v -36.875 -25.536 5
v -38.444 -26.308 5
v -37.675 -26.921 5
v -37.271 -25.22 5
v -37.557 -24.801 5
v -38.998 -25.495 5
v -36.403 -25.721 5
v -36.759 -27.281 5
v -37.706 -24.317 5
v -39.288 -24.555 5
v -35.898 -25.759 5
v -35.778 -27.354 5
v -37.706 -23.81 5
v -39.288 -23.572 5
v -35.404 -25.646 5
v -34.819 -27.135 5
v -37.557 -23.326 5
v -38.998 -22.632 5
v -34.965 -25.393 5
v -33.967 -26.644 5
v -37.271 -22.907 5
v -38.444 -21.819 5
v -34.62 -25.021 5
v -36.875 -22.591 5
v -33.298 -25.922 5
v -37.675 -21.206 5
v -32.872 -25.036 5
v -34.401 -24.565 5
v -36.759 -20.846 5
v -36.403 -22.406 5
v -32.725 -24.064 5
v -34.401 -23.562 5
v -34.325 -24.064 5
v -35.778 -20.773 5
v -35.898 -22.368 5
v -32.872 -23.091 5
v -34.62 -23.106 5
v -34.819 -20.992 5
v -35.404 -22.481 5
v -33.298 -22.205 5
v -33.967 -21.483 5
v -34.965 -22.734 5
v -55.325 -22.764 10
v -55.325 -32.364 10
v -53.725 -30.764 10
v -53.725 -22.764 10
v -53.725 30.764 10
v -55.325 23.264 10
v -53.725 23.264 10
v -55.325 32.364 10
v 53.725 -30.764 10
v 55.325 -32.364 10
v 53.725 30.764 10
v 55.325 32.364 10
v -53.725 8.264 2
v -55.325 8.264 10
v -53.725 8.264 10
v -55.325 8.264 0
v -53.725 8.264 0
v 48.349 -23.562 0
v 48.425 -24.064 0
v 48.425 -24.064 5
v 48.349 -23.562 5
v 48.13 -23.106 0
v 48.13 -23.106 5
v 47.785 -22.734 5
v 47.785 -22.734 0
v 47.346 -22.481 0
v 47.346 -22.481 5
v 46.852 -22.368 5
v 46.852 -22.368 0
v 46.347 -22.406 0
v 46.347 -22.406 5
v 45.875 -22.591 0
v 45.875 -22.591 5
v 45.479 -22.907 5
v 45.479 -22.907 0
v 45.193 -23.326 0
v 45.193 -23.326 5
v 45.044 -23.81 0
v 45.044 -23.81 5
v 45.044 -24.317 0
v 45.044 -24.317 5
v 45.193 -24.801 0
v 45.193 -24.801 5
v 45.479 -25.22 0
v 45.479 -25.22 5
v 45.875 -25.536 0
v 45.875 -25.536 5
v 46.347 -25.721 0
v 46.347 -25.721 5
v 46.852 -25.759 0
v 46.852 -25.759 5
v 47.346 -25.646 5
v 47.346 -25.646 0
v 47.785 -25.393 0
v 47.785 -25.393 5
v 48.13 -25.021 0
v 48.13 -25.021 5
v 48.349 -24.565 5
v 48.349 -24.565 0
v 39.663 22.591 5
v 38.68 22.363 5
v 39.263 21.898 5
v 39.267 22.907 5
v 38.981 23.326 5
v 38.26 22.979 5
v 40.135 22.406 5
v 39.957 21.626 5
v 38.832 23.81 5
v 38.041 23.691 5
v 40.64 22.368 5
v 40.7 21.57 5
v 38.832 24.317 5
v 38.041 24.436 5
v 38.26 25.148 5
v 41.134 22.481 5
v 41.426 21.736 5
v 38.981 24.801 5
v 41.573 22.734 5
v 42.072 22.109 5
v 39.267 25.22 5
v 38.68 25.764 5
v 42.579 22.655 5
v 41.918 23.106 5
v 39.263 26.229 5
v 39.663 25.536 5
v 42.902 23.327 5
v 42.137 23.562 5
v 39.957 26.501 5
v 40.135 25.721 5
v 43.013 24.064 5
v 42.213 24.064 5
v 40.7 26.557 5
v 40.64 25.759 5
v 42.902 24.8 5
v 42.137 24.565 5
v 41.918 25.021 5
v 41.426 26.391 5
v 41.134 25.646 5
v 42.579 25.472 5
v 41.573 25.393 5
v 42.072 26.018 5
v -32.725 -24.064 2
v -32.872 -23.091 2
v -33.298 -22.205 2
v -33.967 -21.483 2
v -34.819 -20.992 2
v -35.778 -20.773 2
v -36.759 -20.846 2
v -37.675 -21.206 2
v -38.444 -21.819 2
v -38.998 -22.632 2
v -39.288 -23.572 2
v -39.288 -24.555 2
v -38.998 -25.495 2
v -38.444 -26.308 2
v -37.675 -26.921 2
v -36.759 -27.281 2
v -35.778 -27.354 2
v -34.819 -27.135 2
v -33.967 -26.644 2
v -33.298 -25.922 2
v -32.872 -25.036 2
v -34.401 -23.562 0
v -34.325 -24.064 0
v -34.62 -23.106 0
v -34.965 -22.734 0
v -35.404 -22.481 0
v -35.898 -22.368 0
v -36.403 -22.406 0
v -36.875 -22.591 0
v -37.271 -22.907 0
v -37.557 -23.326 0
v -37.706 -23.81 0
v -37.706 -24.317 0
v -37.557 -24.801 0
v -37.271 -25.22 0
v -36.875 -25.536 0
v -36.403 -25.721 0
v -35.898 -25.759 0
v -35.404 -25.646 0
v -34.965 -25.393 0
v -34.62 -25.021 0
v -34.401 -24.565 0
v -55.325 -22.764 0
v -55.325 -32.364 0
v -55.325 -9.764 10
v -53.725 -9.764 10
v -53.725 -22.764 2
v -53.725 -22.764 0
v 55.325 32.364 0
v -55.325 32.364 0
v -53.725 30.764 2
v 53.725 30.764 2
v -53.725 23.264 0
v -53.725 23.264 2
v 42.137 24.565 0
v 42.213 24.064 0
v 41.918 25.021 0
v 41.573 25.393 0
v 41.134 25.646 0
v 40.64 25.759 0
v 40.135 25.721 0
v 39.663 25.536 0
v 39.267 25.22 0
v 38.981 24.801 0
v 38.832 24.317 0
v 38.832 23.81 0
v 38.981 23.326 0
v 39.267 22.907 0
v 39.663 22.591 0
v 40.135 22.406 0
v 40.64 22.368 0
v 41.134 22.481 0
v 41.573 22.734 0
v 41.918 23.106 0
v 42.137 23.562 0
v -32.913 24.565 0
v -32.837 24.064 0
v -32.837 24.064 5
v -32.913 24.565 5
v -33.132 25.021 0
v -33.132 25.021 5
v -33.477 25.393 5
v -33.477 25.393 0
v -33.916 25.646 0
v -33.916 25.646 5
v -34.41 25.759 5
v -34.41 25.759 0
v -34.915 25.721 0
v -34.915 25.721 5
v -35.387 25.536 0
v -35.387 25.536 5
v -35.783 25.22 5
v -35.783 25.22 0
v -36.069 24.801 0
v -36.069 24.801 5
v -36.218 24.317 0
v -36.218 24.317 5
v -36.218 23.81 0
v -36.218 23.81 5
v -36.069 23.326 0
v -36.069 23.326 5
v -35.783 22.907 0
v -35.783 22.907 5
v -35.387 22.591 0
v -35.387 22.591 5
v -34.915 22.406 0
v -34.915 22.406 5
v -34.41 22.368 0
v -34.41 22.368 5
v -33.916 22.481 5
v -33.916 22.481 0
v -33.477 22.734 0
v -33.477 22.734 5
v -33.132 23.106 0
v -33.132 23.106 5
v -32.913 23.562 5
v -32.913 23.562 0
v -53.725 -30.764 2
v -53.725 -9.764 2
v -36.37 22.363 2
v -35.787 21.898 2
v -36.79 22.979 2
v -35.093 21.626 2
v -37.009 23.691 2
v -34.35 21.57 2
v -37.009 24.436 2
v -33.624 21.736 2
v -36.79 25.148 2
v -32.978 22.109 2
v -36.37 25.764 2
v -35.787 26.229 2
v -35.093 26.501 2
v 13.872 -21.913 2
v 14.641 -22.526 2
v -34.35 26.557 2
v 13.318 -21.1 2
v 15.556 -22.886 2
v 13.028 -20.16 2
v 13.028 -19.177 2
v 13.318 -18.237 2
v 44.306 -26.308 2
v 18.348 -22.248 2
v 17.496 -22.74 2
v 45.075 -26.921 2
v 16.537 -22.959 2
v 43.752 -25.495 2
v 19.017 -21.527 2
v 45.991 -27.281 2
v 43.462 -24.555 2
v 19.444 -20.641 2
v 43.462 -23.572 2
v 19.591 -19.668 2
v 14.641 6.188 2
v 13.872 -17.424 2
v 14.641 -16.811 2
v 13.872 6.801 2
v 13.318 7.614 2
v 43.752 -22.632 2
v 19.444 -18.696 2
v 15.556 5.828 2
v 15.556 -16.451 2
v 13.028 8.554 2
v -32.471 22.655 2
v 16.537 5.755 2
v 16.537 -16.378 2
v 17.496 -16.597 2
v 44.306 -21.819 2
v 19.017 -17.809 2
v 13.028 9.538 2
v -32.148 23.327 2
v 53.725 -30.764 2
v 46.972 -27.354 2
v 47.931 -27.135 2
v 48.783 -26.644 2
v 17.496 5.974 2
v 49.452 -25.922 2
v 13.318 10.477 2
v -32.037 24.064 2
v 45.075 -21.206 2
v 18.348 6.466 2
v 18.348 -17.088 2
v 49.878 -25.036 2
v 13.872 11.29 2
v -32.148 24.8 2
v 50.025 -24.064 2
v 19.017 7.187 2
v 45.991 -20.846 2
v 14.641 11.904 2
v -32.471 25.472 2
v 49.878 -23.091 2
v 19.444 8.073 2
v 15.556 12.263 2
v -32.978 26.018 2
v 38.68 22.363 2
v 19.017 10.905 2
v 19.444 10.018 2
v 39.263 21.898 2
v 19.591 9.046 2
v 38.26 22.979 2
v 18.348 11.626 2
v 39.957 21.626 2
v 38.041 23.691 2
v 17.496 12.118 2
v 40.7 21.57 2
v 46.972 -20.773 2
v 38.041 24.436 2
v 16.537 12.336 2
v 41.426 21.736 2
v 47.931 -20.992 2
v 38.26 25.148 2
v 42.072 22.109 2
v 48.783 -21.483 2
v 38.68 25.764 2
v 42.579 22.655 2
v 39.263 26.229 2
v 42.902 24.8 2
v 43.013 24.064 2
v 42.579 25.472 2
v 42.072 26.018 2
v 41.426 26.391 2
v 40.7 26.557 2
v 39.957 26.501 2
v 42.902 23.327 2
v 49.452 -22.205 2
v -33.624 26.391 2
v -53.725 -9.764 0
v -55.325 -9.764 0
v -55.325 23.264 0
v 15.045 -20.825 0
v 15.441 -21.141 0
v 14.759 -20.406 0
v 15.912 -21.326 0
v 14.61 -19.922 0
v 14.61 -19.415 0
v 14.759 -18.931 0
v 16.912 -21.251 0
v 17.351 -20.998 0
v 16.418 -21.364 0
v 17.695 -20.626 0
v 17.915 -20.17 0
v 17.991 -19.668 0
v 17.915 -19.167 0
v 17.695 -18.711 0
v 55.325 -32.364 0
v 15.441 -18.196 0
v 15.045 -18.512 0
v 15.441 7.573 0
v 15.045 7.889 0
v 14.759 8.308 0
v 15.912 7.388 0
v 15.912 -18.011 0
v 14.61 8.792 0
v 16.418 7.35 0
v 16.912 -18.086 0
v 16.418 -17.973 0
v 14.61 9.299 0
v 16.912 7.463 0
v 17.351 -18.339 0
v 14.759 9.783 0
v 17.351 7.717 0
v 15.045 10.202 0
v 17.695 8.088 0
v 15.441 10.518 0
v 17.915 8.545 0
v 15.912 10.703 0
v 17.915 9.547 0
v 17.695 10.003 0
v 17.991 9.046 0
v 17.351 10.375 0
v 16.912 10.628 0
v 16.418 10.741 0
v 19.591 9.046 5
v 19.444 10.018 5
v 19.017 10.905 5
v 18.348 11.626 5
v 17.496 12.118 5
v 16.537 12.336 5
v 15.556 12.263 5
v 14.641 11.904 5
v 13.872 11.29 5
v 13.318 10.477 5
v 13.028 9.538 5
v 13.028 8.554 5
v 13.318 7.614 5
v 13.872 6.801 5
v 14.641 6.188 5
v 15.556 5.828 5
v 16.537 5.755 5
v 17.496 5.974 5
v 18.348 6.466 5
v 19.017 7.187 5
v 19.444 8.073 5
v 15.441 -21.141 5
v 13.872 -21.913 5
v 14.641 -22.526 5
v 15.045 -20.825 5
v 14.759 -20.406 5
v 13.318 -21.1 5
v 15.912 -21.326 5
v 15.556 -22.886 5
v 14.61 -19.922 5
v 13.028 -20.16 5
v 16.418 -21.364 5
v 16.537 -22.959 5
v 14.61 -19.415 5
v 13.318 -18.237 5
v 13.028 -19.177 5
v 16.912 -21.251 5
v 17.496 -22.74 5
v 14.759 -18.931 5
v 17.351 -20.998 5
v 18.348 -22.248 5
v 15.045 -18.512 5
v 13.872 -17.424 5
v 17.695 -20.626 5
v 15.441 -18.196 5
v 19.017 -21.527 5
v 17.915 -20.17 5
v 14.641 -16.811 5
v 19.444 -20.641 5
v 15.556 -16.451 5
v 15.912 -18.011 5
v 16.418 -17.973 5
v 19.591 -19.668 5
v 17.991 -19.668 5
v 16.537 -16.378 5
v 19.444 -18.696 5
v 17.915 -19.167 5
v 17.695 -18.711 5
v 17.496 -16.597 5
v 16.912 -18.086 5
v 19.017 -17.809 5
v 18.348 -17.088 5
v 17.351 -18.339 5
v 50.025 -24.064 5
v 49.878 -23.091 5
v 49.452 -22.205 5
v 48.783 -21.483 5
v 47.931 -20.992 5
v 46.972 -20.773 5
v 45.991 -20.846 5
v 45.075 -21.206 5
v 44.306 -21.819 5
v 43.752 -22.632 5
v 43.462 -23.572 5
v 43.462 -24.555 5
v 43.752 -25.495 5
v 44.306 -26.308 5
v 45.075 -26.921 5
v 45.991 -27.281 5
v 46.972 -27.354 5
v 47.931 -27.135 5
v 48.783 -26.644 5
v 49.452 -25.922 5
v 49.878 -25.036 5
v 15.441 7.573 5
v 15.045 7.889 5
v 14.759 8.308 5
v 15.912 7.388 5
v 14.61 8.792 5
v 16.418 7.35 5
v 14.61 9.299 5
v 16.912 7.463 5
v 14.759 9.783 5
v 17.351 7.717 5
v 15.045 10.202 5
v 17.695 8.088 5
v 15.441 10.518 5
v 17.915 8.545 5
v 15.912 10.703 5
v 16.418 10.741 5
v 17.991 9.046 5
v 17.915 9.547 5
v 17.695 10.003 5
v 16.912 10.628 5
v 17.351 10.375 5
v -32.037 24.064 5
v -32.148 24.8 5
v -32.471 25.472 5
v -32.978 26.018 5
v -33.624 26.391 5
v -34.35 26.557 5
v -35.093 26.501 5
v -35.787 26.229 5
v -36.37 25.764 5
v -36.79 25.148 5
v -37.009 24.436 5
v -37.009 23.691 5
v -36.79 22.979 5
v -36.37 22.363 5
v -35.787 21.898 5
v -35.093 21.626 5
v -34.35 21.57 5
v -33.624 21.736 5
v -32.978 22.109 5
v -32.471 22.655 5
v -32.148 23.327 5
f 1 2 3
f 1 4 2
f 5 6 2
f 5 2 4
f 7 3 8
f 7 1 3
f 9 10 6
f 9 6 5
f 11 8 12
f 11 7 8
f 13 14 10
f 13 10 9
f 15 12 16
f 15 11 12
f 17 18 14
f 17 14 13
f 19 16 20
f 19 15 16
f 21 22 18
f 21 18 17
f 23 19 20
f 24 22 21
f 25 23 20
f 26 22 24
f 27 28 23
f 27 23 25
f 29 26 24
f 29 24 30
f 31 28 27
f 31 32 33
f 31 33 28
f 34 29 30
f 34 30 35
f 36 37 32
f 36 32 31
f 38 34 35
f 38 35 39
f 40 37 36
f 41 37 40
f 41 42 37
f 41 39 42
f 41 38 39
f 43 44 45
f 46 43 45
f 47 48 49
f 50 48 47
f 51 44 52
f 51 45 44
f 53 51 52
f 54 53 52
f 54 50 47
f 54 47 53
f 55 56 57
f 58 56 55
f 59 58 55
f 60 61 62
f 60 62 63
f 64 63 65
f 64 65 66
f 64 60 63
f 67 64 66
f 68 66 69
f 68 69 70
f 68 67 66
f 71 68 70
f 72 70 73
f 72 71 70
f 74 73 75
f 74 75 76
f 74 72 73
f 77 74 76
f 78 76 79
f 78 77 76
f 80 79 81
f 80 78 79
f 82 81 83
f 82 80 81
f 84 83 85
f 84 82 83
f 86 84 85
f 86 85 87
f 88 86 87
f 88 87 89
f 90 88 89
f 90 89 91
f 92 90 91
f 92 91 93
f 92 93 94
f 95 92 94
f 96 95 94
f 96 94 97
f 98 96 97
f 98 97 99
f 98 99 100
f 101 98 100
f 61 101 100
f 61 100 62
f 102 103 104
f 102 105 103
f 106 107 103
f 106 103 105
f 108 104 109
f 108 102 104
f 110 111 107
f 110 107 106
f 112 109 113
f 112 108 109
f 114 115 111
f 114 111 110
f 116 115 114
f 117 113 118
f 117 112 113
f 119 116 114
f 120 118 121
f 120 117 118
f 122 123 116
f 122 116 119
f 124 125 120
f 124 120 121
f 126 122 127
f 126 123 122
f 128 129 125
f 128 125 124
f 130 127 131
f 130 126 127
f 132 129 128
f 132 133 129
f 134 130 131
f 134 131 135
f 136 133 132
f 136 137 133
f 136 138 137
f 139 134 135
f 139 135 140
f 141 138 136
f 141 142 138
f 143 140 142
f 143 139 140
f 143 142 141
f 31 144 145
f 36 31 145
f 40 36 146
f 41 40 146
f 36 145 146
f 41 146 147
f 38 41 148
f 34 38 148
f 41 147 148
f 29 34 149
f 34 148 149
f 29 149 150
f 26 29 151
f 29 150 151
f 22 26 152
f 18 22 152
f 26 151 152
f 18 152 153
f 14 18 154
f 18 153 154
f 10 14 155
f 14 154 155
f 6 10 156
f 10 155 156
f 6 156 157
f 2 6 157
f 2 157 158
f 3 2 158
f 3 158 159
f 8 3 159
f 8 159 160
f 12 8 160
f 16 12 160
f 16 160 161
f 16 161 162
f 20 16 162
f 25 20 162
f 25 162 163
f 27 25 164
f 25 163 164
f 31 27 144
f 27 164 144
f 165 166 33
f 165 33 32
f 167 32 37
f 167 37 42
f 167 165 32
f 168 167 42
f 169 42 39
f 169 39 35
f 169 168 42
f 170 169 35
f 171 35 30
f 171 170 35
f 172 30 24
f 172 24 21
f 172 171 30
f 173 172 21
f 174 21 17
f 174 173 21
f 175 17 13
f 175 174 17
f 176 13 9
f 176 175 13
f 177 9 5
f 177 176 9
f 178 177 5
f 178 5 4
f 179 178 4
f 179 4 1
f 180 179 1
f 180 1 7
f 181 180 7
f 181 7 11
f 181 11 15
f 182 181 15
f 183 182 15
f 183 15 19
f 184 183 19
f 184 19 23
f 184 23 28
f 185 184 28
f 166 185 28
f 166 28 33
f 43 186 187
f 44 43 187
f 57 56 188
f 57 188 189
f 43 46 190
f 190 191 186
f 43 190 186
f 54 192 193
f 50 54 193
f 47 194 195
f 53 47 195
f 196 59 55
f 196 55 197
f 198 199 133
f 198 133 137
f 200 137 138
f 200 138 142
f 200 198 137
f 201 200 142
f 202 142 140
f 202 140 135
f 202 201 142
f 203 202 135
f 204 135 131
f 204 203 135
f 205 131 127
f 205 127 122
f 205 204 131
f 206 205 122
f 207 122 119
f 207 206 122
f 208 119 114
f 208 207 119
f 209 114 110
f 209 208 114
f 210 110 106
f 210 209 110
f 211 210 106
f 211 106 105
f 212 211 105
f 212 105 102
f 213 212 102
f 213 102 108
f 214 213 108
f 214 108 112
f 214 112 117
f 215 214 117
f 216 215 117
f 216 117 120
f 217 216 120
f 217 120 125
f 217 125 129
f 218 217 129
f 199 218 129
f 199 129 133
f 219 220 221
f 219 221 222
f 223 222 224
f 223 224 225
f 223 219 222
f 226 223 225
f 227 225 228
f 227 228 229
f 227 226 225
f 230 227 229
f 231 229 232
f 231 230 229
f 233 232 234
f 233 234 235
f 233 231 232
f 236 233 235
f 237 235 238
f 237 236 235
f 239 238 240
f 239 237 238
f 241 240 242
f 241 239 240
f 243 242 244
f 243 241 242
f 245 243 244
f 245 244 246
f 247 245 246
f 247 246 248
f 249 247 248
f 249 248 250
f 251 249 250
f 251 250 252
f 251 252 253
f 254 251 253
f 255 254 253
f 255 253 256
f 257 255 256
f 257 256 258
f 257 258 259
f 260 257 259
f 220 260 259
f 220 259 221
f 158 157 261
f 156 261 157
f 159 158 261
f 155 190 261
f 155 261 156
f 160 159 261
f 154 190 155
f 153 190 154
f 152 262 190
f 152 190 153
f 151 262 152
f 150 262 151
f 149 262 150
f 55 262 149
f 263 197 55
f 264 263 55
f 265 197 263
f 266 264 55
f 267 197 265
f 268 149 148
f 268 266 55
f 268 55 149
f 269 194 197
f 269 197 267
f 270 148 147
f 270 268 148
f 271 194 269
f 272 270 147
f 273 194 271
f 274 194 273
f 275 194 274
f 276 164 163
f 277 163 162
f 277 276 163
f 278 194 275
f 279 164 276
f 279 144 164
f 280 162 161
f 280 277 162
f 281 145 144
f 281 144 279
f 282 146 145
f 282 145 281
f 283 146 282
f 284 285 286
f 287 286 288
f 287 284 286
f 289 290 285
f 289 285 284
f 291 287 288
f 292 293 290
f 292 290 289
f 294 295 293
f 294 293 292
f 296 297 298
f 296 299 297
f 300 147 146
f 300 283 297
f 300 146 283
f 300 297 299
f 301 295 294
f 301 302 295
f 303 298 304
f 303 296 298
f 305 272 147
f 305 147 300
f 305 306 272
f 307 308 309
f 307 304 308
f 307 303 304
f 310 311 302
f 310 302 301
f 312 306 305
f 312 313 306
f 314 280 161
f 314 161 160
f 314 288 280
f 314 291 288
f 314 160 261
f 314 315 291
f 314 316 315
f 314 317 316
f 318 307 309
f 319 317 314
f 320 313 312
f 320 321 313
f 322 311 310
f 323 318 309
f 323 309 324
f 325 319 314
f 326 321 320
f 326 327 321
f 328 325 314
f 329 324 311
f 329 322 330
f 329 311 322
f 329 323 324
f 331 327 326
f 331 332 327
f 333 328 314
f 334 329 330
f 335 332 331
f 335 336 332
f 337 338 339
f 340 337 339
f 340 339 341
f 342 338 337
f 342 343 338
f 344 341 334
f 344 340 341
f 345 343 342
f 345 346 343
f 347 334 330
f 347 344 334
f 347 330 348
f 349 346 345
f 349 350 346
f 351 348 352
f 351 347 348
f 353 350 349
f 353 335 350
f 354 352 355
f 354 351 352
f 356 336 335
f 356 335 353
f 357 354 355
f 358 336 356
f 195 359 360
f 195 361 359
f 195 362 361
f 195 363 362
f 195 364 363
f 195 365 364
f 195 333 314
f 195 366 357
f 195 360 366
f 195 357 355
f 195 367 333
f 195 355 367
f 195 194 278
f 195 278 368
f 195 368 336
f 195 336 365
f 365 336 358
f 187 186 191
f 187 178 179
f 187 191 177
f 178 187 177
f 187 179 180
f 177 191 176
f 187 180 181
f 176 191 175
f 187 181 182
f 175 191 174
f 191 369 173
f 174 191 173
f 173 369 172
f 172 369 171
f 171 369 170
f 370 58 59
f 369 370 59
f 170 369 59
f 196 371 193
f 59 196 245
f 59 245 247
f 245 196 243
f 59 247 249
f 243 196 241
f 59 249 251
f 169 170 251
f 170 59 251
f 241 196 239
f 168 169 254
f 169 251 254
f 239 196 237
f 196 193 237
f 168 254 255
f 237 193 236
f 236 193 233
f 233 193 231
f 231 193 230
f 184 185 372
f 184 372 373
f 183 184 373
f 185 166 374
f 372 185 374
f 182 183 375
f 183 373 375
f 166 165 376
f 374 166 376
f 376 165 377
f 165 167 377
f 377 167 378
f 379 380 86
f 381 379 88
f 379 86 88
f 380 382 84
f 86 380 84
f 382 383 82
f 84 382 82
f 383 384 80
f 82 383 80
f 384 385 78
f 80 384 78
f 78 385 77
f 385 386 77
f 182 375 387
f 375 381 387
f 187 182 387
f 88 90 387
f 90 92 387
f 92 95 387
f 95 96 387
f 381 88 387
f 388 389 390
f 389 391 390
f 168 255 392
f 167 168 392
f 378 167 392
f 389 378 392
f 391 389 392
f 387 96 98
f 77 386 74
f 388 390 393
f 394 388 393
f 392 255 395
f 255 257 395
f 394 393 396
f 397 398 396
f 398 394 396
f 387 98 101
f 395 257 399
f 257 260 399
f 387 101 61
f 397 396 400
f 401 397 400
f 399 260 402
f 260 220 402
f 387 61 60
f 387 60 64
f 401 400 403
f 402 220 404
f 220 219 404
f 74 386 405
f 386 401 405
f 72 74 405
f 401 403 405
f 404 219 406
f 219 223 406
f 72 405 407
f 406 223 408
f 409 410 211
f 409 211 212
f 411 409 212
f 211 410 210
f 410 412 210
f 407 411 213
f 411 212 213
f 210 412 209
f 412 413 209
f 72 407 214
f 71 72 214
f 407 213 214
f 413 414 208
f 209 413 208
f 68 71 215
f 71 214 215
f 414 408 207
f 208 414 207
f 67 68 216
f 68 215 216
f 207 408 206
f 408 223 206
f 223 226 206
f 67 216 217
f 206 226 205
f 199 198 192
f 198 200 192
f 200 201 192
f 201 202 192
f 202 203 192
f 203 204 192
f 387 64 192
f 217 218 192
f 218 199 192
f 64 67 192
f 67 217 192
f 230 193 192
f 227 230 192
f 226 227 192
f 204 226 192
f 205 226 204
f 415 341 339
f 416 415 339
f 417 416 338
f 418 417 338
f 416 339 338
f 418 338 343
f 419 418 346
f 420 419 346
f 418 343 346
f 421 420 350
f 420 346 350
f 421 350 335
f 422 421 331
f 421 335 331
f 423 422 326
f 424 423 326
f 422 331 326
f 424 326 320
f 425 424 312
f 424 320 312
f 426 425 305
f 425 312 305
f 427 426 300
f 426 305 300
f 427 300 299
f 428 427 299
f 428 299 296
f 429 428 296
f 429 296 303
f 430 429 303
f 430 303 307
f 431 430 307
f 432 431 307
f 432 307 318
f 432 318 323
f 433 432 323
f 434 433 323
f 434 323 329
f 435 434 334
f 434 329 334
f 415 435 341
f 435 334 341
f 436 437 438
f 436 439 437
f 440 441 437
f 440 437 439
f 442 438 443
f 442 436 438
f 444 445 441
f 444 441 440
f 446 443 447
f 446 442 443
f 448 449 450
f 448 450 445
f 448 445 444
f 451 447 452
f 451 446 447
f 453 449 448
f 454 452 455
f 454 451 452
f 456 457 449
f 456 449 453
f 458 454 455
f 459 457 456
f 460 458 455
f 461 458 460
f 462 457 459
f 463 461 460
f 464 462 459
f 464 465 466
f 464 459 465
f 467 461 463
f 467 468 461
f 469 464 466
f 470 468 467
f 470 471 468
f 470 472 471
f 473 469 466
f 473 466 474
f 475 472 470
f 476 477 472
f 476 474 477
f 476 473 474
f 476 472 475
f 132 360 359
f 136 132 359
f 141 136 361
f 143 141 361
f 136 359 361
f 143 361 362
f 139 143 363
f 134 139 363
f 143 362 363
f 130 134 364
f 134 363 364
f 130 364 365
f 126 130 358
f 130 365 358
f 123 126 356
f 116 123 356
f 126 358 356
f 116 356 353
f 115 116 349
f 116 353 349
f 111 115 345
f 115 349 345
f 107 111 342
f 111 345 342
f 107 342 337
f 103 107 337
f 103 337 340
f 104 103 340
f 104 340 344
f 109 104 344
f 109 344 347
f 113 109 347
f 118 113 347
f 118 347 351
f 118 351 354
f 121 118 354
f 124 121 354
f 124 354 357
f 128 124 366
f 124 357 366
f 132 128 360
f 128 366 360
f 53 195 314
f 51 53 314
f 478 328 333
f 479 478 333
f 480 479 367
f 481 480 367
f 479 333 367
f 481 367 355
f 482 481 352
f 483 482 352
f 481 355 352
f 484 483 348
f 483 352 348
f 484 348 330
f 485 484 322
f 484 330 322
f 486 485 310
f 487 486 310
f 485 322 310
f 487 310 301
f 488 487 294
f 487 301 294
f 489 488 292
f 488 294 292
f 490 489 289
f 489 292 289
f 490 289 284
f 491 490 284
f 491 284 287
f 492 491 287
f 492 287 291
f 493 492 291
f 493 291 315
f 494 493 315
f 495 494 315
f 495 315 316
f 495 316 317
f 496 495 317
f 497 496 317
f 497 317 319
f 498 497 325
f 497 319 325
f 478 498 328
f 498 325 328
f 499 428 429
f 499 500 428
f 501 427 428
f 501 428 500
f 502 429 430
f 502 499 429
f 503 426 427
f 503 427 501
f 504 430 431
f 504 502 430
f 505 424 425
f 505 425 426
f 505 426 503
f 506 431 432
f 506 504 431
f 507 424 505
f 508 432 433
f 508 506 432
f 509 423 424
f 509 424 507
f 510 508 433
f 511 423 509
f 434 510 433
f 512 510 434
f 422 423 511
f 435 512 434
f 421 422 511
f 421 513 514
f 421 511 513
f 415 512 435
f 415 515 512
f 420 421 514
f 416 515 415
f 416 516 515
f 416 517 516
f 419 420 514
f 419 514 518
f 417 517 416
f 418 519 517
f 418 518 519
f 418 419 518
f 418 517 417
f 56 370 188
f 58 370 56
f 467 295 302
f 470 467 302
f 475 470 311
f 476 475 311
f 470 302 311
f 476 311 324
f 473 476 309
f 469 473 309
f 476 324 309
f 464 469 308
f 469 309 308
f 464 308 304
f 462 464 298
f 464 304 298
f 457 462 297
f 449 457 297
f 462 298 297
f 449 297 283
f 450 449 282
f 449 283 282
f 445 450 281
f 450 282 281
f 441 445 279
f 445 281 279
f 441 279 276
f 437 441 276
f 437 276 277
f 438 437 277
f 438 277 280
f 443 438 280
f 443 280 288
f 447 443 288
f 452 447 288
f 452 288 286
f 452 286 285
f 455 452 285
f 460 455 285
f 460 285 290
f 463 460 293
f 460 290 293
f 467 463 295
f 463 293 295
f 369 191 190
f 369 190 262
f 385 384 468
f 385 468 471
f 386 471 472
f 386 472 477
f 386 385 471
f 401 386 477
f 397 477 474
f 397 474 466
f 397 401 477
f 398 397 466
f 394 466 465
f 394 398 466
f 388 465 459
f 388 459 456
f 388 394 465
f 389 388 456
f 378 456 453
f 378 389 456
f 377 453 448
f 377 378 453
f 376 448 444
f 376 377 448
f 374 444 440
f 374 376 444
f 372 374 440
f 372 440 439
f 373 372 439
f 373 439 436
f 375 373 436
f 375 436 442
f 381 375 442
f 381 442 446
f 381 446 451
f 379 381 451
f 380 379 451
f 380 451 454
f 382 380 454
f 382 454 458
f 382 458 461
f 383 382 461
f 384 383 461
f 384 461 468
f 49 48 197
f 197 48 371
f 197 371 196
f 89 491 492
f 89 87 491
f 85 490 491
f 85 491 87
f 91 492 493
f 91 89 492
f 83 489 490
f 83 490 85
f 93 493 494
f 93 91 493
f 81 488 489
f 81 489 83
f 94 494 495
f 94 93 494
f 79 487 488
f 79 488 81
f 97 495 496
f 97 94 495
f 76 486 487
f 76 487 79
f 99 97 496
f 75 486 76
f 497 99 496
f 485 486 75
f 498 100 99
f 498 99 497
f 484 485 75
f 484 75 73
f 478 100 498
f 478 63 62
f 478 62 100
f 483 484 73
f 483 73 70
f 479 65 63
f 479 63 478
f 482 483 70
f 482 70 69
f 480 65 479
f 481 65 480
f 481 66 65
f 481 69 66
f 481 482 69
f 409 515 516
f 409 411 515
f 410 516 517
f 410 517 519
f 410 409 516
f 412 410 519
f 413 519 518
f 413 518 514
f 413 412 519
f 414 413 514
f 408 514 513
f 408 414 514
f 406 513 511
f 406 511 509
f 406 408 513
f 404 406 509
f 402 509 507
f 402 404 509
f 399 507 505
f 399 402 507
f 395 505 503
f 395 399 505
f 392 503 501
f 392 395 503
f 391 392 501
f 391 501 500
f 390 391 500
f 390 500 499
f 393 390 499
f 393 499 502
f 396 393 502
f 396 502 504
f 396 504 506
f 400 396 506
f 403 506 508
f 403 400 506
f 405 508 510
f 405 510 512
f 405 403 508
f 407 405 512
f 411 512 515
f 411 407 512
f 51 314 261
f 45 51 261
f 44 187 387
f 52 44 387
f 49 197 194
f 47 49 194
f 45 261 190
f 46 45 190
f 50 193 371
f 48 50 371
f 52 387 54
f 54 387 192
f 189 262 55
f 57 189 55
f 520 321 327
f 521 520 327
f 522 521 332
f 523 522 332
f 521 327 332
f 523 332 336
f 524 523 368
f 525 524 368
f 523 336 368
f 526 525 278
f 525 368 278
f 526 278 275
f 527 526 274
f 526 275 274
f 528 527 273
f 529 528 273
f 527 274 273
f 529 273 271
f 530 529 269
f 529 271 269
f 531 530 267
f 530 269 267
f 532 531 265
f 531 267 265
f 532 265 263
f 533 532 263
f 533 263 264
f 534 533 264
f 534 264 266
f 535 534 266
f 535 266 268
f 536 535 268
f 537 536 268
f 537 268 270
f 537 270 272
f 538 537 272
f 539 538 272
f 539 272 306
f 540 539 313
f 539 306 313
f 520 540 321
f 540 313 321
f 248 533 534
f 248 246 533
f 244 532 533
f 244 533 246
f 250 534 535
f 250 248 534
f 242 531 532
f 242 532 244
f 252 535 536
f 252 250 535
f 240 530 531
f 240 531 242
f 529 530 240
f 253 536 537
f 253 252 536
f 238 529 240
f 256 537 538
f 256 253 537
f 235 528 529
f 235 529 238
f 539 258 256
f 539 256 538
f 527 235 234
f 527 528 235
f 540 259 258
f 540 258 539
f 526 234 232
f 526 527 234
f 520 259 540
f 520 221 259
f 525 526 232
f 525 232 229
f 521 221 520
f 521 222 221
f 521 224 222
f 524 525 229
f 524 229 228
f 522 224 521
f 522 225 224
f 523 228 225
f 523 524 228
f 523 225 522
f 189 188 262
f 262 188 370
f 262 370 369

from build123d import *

# Parameters (mm, degrees)
SKETCH_W      = 107.45
SKETCH_H      = 61.527006
SKETCH_R      = 1.7
PAD_DEPTH     = 2
SKETCH001_R   = 3.3
SKETCH001_R_2 = 1.7
SKETCH001_R_3 = 2.5
PAD001_DEPTH  = 3
SKETCH002_W   = 1.6
SKETCH002_H   = 18.027006
PAD002_DEPTH  = 10


with BuildPart() as part:
    # Sketch → Pad (new body)
    with BuildSketch(Plane.XY):
        Rectangle(SKETCH_W, SKETCH_H)
        with Locations((46.725, -24.063503)):
            Circle(SKETCH_R, mode=Mode.SUBTRACT)
        with Locations((-36.025, -24.063503)):
            Circle(SKETCH_R, mode=Mode.SUBTRACT)
        with Locations((16.29071, -19.66845)):
            Circle(SKETCH_R, mode=Mode.SUBTRACT)
        with Locations((-34.537088, 24.063503)):
            Circle(SKETCH_R, mode=Mode.SUBTRACT)
        with Locations((40.512912, 24.063503)):
            Circle(SKETCH_R, mode=Mode.SUBTRACT)
        with Locations((16.29071, 9.045682)):
            Circle(SKETCH_R, mode=Mode.SUBTRACT)
    extrude(amount=PAD_DEPTH)

    # Sketch001 → Pad001 (join)
    with BuildSketch(Plane.XY.offset(2)):
        with Locations((16.29071, 9.045682)):
            Circle(SKETCH001_R)
        with Locations((16.29071, 9.045682)):
            Circle(SKETCH001_R_2, mode=Mode.SUBTRACT)
        with Locations((40.512912, 24.063503)):
            Circle(SKETCH001_R_3)
        with Locations((40.512912, 24.063503)):
            Circle(SKETCH001_R_2, mode=Mode.SUBTRACT)
        with Locations((46.725, -24.063503)):
            Circle(SKETCH001_R)
        with Locations((46.725, -24.063503)):
            Circle(SKETCH001_R_2, mode=Mode.SUBTRACT)
        with Locations((16.29071, -19.66845)):
            Circle(SKETCH001_R)
        with Locations((16.29071, -19.66845)):
            Circle(SKETCH001_R_2, mode=Mode.SUBTRACT)
        with Locations((-36.025, -24.063503)):
            Circle(SKETCH001_R)
        with Locations((-36.025, -24.063503)):
            Circle(SKETCH001_R_2, mode=Mode.SUBTRACT)
        with Locations((-34.537088, 24.063503)):
            Circle(SKETCH001_R_3)
        with Locations((-34.537088, 24.063503)):
            Circle(SKETCH001_R_2, mode=Mode.SUBTRACT)
    extrude(amount=PAD001_DEPTH)

    # Sketch002 → Pad002 (join)
    with BuildSketch(Plane.XY):
        Polygon((-53.725, 30.763503), (53.725, 30.763503), (53.725, -30.763503), (-53.725, -30.763503), (-53.725, -22.763503), (-55.325, -22.763503), (-55.325, -32.363503), (55.325, -32.363503), (55.325, 32.363503), (-55.325, 32.363503), (-55.325, 23.263503), (-53.725, 23.263503), align=None)
        with Locations((-54.525, -0.75)):
            Rectangle(SKETCH002_W, SKETCH002_H)
    extrude(amount=PAD002_DEPTH)


solid = part.part
